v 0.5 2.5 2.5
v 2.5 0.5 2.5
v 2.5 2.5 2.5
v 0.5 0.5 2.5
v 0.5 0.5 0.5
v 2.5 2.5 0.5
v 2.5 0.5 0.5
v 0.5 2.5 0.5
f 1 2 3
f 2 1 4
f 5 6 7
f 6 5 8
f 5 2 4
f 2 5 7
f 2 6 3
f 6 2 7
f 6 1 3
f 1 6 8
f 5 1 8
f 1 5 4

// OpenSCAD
union() {
  translate([0.5, 0.5, 0.5]) cube(size=[2.0,2.0,2.0], center=false);
}
